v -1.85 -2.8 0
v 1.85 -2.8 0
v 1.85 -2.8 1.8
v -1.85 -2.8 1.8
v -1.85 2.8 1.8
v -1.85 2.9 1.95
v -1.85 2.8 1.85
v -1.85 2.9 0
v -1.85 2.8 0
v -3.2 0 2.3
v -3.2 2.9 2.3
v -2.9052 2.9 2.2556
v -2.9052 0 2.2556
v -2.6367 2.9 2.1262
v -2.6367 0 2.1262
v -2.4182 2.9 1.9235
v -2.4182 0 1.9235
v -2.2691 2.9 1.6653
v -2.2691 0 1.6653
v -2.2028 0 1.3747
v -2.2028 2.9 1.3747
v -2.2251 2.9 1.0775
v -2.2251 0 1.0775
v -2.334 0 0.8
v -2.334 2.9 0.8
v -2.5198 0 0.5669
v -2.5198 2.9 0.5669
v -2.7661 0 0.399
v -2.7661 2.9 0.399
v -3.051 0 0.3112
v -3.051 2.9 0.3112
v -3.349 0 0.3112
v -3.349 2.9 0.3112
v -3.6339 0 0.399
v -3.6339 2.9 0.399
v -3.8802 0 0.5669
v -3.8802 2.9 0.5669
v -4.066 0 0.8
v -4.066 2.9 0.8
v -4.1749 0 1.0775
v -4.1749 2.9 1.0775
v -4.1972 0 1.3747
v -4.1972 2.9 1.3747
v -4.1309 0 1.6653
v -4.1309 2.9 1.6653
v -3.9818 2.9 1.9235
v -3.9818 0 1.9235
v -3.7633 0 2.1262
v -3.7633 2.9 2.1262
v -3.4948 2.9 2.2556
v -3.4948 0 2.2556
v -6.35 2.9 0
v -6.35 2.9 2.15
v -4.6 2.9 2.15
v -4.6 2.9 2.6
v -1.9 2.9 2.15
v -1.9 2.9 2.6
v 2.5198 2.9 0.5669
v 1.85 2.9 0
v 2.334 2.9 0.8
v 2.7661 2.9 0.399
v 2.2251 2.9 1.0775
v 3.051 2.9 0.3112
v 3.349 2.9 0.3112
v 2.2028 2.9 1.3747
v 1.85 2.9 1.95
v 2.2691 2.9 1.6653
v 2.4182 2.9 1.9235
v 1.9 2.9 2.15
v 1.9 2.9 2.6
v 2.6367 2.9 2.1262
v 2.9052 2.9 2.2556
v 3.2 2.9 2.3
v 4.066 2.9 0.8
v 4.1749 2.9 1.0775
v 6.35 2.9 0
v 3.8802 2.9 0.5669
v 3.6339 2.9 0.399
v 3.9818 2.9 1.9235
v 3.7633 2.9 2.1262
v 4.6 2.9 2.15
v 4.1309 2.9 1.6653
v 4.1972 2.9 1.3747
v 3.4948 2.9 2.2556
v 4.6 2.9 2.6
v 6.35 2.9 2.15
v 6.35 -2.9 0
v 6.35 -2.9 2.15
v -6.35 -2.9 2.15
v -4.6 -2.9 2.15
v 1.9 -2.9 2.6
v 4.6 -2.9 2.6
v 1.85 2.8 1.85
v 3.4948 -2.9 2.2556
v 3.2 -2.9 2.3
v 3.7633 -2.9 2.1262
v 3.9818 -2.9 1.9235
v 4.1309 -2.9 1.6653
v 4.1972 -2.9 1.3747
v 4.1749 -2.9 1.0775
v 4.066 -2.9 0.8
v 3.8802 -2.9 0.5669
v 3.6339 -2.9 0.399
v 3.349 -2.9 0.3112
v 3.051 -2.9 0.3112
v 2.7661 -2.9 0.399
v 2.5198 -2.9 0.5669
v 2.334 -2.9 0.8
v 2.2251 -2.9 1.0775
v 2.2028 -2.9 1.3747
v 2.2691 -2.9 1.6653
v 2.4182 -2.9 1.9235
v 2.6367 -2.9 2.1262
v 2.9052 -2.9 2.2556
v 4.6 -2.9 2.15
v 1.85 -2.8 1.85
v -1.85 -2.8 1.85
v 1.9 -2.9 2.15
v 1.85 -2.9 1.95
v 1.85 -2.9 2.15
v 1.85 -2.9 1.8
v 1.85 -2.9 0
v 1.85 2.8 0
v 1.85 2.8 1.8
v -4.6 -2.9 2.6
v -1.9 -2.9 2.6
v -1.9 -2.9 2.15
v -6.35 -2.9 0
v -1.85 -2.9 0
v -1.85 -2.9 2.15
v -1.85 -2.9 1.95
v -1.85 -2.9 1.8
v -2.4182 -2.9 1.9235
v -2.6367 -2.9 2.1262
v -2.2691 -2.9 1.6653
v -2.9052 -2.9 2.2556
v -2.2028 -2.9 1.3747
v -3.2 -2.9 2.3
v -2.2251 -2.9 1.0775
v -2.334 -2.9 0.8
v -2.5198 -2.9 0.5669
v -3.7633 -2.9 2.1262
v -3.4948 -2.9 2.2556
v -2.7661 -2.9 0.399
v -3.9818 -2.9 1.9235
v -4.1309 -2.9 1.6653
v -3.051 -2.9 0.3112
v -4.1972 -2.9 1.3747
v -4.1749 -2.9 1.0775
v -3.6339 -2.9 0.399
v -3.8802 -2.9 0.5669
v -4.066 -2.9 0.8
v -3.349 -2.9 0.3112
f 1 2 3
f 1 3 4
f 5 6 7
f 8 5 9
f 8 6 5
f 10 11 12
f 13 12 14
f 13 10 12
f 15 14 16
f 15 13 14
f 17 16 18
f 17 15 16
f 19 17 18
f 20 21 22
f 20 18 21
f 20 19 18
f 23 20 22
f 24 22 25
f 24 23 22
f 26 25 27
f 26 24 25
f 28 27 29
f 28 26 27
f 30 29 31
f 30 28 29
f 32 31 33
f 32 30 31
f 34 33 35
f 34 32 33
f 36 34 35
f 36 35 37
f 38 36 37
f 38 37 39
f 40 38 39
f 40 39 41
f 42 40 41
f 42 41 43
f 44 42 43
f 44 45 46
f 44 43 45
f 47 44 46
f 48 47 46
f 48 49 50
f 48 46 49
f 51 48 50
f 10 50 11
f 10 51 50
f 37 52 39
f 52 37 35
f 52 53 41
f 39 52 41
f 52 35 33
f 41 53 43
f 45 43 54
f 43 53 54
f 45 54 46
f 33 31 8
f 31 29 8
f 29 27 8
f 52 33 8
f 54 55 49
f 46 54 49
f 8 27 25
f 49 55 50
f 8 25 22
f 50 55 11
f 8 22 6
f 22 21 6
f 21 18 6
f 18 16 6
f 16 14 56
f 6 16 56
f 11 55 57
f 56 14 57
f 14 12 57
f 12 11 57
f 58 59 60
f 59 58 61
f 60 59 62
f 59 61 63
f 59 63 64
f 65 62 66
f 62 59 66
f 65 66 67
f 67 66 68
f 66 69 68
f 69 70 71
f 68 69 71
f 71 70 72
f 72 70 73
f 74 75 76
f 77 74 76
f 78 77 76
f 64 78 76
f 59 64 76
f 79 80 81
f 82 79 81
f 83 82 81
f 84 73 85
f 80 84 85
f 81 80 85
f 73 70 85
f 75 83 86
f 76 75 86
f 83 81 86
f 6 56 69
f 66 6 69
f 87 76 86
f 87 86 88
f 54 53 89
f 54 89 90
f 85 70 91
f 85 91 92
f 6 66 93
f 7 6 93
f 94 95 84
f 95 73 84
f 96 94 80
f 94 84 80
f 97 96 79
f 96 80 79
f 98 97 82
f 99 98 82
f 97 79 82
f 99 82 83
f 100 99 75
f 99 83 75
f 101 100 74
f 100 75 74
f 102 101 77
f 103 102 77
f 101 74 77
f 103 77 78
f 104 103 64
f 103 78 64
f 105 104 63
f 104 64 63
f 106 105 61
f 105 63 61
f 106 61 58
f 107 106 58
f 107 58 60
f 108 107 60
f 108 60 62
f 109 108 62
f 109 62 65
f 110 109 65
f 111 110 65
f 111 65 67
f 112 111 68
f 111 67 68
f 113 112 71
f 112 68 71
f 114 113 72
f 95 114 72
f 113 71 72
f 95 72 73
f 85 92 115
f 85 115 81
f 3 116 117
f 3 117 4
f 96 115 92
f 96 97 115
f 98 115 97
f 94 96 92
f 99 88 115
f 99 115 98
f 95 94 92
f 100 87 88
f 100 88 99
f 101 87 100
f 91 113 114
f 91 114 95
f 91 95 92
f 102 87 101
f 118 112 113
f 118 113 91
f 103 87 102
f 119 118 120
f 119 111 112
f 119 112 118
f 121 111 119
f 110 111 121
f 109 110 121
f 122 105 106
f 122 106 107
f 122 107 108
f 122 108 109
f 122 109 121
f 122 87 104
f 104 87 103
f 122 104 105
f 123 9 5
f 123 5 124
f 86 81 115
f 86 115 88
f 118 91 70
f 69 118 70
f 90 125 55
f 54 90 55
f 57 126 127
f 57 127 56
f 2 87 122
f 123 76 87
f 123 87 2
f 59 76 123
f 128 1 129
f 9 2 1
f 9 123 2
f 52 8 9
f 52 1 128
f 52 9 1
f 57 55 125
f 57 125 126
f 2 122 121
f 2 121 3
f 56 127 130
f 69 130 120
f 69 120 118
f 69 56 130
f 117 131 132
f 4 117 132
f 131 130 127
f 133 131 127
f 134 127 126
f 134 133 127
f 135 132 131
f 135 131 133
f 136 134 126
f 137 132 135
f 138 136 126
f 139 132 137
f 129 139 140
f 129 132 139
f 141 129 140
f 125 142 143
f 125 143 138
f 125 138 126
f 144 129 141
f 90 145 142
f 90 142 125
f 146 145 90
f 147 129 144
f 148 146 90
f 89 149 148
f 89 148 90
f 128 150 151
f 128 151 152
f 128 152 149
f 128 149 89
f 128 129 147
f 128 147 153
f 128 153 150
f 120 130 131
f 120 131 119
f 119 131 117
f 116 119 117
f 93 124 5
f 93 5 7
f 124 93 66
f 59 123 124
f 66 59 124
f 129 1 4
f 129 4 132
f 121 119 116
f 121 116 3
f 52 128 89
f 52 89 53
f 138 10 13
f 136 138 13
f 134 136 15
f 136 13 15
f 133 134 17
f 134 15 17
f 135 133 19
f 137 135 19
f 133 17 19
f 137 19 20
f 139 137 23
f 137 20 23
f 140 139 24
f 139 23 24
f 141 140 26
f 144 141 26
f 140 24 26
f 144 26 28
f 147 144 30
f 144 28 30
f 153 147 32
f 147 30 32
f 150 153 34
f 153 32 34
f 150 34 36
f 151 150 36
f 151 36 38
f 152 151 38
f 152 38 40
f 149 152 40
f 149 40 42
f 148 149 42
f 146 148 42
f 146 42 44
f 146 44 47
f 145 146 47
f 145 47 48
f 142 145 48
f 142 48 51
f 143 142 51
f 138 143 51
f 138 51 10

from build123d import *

# Parameters (mm, degrees)
SALIENTE_EXTRUIR1_DEPTH = 2.6
CROQUIS2_R              = 1
CORTAR_EXTRUIR1_DEPTH   = 3
CROQUIS4_W              = 3.7
CROQUIS4_H              = 0.1
SALIENTE_EXTRUIR2_DEPTH = 0.8
CHAFL_N1_SIZE           = 0.15
CROQUIS5_W              = 3.8
CROQUIS5_H              = 5.8
CROQUIS5_W_2            = 1.75
CORTAR_EXTRUIR2_DEPTH   = 0.45


with BuildPart() as part:
    # Croquis1 → Saliente-Extruir1 (new body)
    with BuildSketch(Plane.XY):
        Polygon((-1.85, 2.8), (1.85, 2.8), (1.85, 2.9), (6.35, 2.9), (6.35, -2.9), (1.85, -2.9), (1.85, -2.8), (-1.85, -2.8), (-1.85, -2.9), (-6.35, -2.9), (-6.35, 2.9), (-1.85, 2.9), align=None)
    extrude(amount=SALIENTE_EXTRUIR1_DEPTH)

    # Croquis2 → Cortar-Extruir1 (cut, symmetric)
    with BuildSketch(Plane(origin=(0, 0, 0), x_dir=(1, 0, 0), z_dir=(0, 1, 0))):
        with Locations(Location((-3.2, -1.3, 0), (0, 0, 270))):
            Circle(CROQUIS2_R)
        with Locations(Location((3.2, -1.3, 0), (0, 0, 270))):
            Circle(CROQUIS2_R)
    extrude(amount=CORTAR_EXTRUIR1_DEPTH, both=True, mode=Mode.SUBTRACT)

    # Croquis4 → Saliente-Extruir2 (add)
    with BuildSketch(Plane.XY.offset(2.6)):
        with Locations((0, 2.85)):
            Rectangle(CROQUIS4_W, CROQUIS4_H)
        with Locations((0, -2.85)):
            Rectangle(CROQUIS4_W, CROQUIS4_H)
    extrude(amount=-SALIENTE_EXTRUIR2_DEPTH)

    # Chaflán1
    # the kernel refuses this chamfer: 0.15 mm, written as the material it takes off along each edge
    with BuildSketch(Plane(origin=(-1.85, -2.9, 1.8), x_dir=(0, -0.027495876610587378, 0.9996219169112965), z_dir=(1, 0, 0))) as chafl_n1_piece_1_section:
        Polygon((CHAFL_N1_SIZE * 0.999621916911, -CHAFL_N1_SIZE * 0.0274958766106), (-CHAFL_N1_SIZE * 0.0274958766106, -CHAFL_N1_SIZE * 0.999621916911), (0, 0), align=None)
    chafl_n1_piece_1 = extrude(amount=3.7, mode=Mode.PRIVATE)
    chafl_n1_piece_1 = split(chafl_n1_piece_1, bisect_by=Plane(origin=(0, -2.8, 1.85460455), z_dir=(0, -1, 0)), keep=Keep.TOP, mode=Mode.PRIVATE)
    add(chafl_n1_piece_1, mode=Mode.SUBTRACT)
    with BuildSketch(Plane(origin=(1.85, 2.9, 1.8), x_dir=(0, 0.027495876610587378, 0.9996219169112965), z_dir=(-1, 0, 0))) as chafl_n1_piece_2_section:
        Polygon((CHAFL_N1_SIZE * 0.999621916911, -CHAFL_N1_SIZE * 0.0274958766106), (-CHAFL_N1_SIZE * 0.0274958766106, -CHAFL_N1_SIZE * 0.999621916911), (0, 0), align=None)
    chafl_n1_piece_2 = extrude(amount=3.7, mode=Mode.PRIVATE)
    chafl_n1_piece_2 = split(chafl_n1_piece_2, bisect_by=Plane(origin=(0, 2.8, 1.85460455), z_dir=(0, 1, 0)), keep=Keep.TOP, mode=Mode.PRIVATE)
    add(chafl_n1_piece_2, mode=Mode.SUBTRACT)

    # Croquis5 → Cortar-Extruir2 (cut)
    with BuildSketch(Plane.XY.offset(2.6)):
        Rectangle(CROQUIS5_W, CROQUIS5_H)
        with Locations((-5.475, 0)):
            Rectangle(CROQUIS5_W_2, CROQUIS5_H)
        with Locations((5.475, 0)):
            Rectangle(CROQUIS5_W_2, CROQUIS5_H)
    extrude(amount=-CORTAR_EXTRUIR2_DEPTH, mode=Mode.SUBTRACT)


solid = part.part
